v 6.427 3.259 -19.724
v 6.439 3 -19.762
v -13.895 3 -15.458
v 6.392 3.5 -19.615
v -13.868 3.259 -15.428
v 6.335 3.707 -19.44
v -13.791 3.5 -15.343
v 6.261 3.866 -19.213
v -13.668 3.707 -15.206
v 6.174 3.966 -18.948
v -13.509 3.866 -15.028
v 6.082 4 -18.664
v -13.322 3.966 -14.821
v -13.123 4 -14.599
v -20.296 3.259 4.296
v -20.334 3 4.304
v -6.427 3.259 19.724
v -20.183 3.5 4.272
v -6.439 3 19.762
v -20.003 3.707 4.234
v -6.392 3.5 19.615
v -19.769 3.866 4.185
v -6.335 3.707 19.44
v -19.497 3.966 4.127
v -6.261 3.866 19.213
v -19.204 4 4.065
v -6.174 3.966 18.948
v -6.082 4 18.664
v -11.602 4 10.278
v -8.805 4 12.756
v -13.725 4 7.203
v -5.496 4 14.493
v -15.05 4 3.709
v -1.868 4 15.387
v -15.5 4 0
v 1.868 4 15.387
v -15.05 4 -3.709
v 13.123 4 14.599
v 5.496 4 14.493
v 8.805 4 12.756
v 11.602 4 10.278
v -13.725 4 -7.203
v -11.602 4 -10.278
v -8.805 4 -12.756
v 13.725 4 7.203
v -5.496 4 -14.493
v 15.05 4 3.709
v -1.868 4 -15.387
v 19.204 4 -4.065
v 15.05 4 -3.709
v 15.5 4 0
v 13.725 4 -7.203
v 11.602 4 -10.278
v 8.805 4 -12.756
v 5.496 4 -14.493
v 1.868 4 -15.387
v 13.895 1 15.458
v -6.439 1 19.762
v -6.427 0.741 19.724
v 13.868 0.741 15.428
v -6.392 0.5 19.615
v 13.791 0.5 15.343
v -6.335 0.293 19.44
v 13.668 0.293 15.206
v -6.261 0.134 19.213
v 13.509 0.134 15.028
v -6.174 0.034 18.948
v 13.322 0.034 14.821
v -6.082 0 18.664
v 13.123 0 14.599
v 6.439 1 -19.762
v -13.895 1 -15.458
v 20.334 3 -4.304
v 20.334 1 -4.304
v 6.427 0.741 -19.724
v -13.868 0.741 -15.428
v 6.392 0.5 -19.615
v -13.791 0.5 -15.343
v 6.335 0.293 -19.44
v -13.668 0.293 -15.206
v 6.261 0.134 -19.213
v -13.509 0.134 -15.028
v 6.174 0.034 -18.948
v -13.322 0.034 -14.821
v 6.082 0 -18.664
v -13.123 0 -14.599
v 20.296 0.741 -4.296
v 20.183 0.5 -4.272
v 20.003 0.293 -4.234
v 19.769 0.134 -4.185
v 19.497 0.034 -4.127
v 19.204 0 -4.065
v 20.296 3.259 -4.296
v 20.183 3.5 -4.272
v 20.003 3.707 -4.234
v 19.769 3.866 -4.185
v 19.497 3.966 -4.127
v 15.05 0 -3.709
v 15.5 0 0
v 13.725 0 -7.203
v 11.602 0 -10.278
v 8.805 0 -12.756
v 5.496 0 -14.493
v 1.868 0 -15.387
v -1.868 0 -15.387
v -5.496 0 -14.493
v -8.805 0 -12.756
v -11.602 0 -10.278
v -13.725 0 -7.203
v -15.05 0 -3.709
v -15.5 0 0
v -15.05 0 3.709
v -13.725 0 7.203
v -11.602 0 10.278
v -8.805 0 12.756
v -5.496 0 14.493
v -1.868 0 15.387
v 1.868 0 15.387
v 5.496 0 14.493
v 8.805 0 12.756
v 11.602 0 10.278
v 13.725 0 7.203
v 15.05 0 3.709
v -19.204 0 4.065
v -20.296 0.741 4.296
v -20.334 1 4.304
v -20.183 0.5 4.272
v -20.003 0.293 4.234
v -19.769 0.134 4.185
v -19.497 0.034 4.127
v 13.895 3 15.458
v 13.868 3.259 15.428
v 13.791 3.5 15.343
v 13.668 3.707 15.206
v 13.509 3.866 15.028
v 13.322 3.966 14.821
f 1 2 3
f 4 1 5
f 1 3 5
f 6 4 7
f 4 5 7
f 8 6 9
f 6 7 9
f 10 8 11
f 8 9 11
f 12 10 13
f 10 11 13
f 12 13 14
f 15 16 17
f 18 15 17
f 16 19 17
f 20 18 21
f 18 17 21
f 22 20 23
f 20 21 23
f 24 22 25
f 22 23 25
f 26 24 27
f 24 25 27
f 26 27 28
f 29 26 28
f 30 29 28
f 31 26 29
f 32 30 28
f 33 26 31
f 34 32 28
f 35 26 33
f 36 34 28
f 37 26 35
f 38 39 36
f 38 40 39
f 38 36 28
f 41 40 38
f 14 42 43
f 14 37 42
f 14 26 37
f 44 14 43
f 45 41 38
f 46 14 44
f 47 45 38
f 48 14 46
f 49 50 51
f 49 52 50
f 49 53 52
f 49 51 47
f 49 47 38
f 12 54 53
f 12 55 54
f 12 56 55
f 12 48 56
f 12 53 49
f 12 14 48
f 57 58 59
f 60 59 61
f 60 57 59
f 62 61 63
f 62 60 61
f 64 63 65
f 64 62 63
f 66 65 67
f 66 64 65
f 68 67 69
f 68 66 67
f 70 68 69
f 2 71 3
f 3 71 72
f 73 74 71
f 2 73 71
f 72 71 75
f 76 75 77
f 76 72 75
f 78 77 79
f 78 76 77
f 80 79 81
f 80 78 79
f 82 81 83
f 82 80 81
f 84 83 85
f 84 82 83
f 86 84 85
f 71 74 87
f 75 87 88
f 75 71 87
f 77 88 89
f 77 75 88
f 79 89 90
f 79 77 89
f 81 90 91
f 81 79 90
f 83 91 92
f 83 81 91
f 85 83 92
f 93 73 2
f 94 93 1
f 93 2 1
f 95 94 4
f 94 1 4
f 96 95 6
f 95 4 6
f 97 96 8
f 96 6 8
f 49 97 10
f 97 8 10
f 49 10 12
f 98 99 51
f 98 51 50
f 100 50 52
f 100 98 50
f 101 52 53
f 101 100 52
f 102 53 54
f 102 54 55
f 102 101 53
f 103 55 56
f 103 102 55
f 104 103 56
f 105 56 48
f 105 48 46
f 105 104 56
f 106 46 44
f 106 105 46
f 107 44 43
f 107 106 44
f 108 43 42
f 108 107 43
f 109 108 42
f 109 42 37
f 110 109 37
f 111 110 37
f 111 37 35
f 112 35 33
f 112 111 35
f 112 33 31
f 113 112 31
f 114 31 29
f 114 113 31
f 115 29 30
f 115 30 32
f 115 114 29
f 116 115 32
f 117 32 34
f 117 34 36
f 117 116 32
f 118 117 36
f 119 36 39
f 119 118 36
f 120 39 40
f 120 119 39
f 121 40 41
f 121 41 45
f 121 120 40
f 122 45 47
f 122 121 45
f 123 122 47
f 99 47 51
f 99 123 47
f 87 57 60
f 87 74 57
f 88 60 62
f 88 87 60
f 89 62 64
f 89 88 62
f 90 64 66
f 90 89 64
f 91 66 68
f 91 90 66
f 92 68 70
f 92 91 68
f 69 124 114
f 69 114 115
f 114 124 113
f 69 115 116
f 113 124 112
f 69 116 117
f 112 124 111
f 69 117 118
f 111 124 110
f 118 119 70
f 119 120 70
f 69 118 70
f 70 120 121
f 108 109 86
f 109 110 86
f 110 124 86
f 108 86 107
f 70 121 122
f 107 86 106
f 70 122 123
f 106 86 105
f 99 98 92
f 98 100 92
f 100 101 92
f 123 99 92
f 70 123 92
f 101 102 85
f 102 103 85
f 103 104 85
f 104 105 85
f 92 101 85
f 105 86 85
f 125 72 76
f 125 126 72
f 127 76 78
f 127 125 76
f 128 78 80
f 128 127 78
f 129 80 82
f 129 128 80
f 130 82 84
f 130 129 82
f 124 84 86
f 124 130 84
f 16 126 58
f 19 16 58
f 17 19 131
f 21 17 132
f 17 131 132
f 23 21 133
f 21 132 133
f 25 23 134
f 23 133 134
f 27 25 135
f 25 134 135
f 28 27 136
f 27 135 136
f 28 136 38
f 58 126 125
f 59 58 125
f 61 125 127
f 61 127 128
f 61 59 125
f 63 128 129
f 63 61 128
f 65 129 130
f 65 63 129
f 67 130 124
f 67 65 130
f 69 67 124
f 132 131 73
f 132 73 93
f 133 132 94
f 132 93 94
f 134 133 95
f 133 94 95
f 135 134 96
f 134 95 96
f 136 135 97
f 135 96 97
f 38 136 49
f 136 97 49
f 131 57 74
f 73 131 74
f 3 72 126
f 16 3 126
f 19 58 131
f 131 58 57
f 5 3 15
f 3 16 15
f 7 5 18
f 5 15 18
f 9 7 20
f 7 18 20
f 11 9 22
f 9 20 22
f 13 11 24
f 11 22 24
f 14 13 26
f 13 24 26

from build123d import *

# Parameters (mm, degrees)
SKETCH_1_R      = 15.5
EXTRUDE_1_DEPTH = 4
FILLET_1_R      = 1


with BuildPart() as part:
    # 草图1 → 凸台-拉伸1 (new body)
    with BuildSketch(Plane(origin=(0, 0, 0), x_dir=(1, 0, 0), z_dir=(0, 1, 0))):
        Polygon((13.894572462, -15.457711864), (20.33405739, 4.304196795), (6.439484928, 19.761908659), (-13.894572462, 15.457711864), (-20.33405739, -4.304196795), (-6.439484928, -19.761908659), align=None)
        Circle(SKETCH_1_R, mode=Mode.SUBTRACT)
    extrude(amount=EXTRUDE_1_DEPTH)

    # 圆角1
    fillet_1_edges = [part.edges().sort_by_distance(p)[0] for p in [
        (13.386771159, 4, -12.033052727),
        (-3.727543767, 4, -17.609810262),
        (-17.114314926, 4, -5.576757535),
        (-13.386771159, 4, 12.033052727),
        (3.727543767, 4, 17.609810262),
        (-13.386771159, 0, 12.033052727),
        (-17.114314926, 0, -5.576757535),
        (-3.727543767, 0, -17.609810262),
        (17.114314926, 4, 5.576757535),
        (13.386771159, 0, -12.033052727),
        (17.114314926, 0, 5.576757535),
        (3.727543767, 0, 17.609810262),
    ]]
    fillet(fillet_1_edges, radius=FILLET_1_R)


solid = part.part
